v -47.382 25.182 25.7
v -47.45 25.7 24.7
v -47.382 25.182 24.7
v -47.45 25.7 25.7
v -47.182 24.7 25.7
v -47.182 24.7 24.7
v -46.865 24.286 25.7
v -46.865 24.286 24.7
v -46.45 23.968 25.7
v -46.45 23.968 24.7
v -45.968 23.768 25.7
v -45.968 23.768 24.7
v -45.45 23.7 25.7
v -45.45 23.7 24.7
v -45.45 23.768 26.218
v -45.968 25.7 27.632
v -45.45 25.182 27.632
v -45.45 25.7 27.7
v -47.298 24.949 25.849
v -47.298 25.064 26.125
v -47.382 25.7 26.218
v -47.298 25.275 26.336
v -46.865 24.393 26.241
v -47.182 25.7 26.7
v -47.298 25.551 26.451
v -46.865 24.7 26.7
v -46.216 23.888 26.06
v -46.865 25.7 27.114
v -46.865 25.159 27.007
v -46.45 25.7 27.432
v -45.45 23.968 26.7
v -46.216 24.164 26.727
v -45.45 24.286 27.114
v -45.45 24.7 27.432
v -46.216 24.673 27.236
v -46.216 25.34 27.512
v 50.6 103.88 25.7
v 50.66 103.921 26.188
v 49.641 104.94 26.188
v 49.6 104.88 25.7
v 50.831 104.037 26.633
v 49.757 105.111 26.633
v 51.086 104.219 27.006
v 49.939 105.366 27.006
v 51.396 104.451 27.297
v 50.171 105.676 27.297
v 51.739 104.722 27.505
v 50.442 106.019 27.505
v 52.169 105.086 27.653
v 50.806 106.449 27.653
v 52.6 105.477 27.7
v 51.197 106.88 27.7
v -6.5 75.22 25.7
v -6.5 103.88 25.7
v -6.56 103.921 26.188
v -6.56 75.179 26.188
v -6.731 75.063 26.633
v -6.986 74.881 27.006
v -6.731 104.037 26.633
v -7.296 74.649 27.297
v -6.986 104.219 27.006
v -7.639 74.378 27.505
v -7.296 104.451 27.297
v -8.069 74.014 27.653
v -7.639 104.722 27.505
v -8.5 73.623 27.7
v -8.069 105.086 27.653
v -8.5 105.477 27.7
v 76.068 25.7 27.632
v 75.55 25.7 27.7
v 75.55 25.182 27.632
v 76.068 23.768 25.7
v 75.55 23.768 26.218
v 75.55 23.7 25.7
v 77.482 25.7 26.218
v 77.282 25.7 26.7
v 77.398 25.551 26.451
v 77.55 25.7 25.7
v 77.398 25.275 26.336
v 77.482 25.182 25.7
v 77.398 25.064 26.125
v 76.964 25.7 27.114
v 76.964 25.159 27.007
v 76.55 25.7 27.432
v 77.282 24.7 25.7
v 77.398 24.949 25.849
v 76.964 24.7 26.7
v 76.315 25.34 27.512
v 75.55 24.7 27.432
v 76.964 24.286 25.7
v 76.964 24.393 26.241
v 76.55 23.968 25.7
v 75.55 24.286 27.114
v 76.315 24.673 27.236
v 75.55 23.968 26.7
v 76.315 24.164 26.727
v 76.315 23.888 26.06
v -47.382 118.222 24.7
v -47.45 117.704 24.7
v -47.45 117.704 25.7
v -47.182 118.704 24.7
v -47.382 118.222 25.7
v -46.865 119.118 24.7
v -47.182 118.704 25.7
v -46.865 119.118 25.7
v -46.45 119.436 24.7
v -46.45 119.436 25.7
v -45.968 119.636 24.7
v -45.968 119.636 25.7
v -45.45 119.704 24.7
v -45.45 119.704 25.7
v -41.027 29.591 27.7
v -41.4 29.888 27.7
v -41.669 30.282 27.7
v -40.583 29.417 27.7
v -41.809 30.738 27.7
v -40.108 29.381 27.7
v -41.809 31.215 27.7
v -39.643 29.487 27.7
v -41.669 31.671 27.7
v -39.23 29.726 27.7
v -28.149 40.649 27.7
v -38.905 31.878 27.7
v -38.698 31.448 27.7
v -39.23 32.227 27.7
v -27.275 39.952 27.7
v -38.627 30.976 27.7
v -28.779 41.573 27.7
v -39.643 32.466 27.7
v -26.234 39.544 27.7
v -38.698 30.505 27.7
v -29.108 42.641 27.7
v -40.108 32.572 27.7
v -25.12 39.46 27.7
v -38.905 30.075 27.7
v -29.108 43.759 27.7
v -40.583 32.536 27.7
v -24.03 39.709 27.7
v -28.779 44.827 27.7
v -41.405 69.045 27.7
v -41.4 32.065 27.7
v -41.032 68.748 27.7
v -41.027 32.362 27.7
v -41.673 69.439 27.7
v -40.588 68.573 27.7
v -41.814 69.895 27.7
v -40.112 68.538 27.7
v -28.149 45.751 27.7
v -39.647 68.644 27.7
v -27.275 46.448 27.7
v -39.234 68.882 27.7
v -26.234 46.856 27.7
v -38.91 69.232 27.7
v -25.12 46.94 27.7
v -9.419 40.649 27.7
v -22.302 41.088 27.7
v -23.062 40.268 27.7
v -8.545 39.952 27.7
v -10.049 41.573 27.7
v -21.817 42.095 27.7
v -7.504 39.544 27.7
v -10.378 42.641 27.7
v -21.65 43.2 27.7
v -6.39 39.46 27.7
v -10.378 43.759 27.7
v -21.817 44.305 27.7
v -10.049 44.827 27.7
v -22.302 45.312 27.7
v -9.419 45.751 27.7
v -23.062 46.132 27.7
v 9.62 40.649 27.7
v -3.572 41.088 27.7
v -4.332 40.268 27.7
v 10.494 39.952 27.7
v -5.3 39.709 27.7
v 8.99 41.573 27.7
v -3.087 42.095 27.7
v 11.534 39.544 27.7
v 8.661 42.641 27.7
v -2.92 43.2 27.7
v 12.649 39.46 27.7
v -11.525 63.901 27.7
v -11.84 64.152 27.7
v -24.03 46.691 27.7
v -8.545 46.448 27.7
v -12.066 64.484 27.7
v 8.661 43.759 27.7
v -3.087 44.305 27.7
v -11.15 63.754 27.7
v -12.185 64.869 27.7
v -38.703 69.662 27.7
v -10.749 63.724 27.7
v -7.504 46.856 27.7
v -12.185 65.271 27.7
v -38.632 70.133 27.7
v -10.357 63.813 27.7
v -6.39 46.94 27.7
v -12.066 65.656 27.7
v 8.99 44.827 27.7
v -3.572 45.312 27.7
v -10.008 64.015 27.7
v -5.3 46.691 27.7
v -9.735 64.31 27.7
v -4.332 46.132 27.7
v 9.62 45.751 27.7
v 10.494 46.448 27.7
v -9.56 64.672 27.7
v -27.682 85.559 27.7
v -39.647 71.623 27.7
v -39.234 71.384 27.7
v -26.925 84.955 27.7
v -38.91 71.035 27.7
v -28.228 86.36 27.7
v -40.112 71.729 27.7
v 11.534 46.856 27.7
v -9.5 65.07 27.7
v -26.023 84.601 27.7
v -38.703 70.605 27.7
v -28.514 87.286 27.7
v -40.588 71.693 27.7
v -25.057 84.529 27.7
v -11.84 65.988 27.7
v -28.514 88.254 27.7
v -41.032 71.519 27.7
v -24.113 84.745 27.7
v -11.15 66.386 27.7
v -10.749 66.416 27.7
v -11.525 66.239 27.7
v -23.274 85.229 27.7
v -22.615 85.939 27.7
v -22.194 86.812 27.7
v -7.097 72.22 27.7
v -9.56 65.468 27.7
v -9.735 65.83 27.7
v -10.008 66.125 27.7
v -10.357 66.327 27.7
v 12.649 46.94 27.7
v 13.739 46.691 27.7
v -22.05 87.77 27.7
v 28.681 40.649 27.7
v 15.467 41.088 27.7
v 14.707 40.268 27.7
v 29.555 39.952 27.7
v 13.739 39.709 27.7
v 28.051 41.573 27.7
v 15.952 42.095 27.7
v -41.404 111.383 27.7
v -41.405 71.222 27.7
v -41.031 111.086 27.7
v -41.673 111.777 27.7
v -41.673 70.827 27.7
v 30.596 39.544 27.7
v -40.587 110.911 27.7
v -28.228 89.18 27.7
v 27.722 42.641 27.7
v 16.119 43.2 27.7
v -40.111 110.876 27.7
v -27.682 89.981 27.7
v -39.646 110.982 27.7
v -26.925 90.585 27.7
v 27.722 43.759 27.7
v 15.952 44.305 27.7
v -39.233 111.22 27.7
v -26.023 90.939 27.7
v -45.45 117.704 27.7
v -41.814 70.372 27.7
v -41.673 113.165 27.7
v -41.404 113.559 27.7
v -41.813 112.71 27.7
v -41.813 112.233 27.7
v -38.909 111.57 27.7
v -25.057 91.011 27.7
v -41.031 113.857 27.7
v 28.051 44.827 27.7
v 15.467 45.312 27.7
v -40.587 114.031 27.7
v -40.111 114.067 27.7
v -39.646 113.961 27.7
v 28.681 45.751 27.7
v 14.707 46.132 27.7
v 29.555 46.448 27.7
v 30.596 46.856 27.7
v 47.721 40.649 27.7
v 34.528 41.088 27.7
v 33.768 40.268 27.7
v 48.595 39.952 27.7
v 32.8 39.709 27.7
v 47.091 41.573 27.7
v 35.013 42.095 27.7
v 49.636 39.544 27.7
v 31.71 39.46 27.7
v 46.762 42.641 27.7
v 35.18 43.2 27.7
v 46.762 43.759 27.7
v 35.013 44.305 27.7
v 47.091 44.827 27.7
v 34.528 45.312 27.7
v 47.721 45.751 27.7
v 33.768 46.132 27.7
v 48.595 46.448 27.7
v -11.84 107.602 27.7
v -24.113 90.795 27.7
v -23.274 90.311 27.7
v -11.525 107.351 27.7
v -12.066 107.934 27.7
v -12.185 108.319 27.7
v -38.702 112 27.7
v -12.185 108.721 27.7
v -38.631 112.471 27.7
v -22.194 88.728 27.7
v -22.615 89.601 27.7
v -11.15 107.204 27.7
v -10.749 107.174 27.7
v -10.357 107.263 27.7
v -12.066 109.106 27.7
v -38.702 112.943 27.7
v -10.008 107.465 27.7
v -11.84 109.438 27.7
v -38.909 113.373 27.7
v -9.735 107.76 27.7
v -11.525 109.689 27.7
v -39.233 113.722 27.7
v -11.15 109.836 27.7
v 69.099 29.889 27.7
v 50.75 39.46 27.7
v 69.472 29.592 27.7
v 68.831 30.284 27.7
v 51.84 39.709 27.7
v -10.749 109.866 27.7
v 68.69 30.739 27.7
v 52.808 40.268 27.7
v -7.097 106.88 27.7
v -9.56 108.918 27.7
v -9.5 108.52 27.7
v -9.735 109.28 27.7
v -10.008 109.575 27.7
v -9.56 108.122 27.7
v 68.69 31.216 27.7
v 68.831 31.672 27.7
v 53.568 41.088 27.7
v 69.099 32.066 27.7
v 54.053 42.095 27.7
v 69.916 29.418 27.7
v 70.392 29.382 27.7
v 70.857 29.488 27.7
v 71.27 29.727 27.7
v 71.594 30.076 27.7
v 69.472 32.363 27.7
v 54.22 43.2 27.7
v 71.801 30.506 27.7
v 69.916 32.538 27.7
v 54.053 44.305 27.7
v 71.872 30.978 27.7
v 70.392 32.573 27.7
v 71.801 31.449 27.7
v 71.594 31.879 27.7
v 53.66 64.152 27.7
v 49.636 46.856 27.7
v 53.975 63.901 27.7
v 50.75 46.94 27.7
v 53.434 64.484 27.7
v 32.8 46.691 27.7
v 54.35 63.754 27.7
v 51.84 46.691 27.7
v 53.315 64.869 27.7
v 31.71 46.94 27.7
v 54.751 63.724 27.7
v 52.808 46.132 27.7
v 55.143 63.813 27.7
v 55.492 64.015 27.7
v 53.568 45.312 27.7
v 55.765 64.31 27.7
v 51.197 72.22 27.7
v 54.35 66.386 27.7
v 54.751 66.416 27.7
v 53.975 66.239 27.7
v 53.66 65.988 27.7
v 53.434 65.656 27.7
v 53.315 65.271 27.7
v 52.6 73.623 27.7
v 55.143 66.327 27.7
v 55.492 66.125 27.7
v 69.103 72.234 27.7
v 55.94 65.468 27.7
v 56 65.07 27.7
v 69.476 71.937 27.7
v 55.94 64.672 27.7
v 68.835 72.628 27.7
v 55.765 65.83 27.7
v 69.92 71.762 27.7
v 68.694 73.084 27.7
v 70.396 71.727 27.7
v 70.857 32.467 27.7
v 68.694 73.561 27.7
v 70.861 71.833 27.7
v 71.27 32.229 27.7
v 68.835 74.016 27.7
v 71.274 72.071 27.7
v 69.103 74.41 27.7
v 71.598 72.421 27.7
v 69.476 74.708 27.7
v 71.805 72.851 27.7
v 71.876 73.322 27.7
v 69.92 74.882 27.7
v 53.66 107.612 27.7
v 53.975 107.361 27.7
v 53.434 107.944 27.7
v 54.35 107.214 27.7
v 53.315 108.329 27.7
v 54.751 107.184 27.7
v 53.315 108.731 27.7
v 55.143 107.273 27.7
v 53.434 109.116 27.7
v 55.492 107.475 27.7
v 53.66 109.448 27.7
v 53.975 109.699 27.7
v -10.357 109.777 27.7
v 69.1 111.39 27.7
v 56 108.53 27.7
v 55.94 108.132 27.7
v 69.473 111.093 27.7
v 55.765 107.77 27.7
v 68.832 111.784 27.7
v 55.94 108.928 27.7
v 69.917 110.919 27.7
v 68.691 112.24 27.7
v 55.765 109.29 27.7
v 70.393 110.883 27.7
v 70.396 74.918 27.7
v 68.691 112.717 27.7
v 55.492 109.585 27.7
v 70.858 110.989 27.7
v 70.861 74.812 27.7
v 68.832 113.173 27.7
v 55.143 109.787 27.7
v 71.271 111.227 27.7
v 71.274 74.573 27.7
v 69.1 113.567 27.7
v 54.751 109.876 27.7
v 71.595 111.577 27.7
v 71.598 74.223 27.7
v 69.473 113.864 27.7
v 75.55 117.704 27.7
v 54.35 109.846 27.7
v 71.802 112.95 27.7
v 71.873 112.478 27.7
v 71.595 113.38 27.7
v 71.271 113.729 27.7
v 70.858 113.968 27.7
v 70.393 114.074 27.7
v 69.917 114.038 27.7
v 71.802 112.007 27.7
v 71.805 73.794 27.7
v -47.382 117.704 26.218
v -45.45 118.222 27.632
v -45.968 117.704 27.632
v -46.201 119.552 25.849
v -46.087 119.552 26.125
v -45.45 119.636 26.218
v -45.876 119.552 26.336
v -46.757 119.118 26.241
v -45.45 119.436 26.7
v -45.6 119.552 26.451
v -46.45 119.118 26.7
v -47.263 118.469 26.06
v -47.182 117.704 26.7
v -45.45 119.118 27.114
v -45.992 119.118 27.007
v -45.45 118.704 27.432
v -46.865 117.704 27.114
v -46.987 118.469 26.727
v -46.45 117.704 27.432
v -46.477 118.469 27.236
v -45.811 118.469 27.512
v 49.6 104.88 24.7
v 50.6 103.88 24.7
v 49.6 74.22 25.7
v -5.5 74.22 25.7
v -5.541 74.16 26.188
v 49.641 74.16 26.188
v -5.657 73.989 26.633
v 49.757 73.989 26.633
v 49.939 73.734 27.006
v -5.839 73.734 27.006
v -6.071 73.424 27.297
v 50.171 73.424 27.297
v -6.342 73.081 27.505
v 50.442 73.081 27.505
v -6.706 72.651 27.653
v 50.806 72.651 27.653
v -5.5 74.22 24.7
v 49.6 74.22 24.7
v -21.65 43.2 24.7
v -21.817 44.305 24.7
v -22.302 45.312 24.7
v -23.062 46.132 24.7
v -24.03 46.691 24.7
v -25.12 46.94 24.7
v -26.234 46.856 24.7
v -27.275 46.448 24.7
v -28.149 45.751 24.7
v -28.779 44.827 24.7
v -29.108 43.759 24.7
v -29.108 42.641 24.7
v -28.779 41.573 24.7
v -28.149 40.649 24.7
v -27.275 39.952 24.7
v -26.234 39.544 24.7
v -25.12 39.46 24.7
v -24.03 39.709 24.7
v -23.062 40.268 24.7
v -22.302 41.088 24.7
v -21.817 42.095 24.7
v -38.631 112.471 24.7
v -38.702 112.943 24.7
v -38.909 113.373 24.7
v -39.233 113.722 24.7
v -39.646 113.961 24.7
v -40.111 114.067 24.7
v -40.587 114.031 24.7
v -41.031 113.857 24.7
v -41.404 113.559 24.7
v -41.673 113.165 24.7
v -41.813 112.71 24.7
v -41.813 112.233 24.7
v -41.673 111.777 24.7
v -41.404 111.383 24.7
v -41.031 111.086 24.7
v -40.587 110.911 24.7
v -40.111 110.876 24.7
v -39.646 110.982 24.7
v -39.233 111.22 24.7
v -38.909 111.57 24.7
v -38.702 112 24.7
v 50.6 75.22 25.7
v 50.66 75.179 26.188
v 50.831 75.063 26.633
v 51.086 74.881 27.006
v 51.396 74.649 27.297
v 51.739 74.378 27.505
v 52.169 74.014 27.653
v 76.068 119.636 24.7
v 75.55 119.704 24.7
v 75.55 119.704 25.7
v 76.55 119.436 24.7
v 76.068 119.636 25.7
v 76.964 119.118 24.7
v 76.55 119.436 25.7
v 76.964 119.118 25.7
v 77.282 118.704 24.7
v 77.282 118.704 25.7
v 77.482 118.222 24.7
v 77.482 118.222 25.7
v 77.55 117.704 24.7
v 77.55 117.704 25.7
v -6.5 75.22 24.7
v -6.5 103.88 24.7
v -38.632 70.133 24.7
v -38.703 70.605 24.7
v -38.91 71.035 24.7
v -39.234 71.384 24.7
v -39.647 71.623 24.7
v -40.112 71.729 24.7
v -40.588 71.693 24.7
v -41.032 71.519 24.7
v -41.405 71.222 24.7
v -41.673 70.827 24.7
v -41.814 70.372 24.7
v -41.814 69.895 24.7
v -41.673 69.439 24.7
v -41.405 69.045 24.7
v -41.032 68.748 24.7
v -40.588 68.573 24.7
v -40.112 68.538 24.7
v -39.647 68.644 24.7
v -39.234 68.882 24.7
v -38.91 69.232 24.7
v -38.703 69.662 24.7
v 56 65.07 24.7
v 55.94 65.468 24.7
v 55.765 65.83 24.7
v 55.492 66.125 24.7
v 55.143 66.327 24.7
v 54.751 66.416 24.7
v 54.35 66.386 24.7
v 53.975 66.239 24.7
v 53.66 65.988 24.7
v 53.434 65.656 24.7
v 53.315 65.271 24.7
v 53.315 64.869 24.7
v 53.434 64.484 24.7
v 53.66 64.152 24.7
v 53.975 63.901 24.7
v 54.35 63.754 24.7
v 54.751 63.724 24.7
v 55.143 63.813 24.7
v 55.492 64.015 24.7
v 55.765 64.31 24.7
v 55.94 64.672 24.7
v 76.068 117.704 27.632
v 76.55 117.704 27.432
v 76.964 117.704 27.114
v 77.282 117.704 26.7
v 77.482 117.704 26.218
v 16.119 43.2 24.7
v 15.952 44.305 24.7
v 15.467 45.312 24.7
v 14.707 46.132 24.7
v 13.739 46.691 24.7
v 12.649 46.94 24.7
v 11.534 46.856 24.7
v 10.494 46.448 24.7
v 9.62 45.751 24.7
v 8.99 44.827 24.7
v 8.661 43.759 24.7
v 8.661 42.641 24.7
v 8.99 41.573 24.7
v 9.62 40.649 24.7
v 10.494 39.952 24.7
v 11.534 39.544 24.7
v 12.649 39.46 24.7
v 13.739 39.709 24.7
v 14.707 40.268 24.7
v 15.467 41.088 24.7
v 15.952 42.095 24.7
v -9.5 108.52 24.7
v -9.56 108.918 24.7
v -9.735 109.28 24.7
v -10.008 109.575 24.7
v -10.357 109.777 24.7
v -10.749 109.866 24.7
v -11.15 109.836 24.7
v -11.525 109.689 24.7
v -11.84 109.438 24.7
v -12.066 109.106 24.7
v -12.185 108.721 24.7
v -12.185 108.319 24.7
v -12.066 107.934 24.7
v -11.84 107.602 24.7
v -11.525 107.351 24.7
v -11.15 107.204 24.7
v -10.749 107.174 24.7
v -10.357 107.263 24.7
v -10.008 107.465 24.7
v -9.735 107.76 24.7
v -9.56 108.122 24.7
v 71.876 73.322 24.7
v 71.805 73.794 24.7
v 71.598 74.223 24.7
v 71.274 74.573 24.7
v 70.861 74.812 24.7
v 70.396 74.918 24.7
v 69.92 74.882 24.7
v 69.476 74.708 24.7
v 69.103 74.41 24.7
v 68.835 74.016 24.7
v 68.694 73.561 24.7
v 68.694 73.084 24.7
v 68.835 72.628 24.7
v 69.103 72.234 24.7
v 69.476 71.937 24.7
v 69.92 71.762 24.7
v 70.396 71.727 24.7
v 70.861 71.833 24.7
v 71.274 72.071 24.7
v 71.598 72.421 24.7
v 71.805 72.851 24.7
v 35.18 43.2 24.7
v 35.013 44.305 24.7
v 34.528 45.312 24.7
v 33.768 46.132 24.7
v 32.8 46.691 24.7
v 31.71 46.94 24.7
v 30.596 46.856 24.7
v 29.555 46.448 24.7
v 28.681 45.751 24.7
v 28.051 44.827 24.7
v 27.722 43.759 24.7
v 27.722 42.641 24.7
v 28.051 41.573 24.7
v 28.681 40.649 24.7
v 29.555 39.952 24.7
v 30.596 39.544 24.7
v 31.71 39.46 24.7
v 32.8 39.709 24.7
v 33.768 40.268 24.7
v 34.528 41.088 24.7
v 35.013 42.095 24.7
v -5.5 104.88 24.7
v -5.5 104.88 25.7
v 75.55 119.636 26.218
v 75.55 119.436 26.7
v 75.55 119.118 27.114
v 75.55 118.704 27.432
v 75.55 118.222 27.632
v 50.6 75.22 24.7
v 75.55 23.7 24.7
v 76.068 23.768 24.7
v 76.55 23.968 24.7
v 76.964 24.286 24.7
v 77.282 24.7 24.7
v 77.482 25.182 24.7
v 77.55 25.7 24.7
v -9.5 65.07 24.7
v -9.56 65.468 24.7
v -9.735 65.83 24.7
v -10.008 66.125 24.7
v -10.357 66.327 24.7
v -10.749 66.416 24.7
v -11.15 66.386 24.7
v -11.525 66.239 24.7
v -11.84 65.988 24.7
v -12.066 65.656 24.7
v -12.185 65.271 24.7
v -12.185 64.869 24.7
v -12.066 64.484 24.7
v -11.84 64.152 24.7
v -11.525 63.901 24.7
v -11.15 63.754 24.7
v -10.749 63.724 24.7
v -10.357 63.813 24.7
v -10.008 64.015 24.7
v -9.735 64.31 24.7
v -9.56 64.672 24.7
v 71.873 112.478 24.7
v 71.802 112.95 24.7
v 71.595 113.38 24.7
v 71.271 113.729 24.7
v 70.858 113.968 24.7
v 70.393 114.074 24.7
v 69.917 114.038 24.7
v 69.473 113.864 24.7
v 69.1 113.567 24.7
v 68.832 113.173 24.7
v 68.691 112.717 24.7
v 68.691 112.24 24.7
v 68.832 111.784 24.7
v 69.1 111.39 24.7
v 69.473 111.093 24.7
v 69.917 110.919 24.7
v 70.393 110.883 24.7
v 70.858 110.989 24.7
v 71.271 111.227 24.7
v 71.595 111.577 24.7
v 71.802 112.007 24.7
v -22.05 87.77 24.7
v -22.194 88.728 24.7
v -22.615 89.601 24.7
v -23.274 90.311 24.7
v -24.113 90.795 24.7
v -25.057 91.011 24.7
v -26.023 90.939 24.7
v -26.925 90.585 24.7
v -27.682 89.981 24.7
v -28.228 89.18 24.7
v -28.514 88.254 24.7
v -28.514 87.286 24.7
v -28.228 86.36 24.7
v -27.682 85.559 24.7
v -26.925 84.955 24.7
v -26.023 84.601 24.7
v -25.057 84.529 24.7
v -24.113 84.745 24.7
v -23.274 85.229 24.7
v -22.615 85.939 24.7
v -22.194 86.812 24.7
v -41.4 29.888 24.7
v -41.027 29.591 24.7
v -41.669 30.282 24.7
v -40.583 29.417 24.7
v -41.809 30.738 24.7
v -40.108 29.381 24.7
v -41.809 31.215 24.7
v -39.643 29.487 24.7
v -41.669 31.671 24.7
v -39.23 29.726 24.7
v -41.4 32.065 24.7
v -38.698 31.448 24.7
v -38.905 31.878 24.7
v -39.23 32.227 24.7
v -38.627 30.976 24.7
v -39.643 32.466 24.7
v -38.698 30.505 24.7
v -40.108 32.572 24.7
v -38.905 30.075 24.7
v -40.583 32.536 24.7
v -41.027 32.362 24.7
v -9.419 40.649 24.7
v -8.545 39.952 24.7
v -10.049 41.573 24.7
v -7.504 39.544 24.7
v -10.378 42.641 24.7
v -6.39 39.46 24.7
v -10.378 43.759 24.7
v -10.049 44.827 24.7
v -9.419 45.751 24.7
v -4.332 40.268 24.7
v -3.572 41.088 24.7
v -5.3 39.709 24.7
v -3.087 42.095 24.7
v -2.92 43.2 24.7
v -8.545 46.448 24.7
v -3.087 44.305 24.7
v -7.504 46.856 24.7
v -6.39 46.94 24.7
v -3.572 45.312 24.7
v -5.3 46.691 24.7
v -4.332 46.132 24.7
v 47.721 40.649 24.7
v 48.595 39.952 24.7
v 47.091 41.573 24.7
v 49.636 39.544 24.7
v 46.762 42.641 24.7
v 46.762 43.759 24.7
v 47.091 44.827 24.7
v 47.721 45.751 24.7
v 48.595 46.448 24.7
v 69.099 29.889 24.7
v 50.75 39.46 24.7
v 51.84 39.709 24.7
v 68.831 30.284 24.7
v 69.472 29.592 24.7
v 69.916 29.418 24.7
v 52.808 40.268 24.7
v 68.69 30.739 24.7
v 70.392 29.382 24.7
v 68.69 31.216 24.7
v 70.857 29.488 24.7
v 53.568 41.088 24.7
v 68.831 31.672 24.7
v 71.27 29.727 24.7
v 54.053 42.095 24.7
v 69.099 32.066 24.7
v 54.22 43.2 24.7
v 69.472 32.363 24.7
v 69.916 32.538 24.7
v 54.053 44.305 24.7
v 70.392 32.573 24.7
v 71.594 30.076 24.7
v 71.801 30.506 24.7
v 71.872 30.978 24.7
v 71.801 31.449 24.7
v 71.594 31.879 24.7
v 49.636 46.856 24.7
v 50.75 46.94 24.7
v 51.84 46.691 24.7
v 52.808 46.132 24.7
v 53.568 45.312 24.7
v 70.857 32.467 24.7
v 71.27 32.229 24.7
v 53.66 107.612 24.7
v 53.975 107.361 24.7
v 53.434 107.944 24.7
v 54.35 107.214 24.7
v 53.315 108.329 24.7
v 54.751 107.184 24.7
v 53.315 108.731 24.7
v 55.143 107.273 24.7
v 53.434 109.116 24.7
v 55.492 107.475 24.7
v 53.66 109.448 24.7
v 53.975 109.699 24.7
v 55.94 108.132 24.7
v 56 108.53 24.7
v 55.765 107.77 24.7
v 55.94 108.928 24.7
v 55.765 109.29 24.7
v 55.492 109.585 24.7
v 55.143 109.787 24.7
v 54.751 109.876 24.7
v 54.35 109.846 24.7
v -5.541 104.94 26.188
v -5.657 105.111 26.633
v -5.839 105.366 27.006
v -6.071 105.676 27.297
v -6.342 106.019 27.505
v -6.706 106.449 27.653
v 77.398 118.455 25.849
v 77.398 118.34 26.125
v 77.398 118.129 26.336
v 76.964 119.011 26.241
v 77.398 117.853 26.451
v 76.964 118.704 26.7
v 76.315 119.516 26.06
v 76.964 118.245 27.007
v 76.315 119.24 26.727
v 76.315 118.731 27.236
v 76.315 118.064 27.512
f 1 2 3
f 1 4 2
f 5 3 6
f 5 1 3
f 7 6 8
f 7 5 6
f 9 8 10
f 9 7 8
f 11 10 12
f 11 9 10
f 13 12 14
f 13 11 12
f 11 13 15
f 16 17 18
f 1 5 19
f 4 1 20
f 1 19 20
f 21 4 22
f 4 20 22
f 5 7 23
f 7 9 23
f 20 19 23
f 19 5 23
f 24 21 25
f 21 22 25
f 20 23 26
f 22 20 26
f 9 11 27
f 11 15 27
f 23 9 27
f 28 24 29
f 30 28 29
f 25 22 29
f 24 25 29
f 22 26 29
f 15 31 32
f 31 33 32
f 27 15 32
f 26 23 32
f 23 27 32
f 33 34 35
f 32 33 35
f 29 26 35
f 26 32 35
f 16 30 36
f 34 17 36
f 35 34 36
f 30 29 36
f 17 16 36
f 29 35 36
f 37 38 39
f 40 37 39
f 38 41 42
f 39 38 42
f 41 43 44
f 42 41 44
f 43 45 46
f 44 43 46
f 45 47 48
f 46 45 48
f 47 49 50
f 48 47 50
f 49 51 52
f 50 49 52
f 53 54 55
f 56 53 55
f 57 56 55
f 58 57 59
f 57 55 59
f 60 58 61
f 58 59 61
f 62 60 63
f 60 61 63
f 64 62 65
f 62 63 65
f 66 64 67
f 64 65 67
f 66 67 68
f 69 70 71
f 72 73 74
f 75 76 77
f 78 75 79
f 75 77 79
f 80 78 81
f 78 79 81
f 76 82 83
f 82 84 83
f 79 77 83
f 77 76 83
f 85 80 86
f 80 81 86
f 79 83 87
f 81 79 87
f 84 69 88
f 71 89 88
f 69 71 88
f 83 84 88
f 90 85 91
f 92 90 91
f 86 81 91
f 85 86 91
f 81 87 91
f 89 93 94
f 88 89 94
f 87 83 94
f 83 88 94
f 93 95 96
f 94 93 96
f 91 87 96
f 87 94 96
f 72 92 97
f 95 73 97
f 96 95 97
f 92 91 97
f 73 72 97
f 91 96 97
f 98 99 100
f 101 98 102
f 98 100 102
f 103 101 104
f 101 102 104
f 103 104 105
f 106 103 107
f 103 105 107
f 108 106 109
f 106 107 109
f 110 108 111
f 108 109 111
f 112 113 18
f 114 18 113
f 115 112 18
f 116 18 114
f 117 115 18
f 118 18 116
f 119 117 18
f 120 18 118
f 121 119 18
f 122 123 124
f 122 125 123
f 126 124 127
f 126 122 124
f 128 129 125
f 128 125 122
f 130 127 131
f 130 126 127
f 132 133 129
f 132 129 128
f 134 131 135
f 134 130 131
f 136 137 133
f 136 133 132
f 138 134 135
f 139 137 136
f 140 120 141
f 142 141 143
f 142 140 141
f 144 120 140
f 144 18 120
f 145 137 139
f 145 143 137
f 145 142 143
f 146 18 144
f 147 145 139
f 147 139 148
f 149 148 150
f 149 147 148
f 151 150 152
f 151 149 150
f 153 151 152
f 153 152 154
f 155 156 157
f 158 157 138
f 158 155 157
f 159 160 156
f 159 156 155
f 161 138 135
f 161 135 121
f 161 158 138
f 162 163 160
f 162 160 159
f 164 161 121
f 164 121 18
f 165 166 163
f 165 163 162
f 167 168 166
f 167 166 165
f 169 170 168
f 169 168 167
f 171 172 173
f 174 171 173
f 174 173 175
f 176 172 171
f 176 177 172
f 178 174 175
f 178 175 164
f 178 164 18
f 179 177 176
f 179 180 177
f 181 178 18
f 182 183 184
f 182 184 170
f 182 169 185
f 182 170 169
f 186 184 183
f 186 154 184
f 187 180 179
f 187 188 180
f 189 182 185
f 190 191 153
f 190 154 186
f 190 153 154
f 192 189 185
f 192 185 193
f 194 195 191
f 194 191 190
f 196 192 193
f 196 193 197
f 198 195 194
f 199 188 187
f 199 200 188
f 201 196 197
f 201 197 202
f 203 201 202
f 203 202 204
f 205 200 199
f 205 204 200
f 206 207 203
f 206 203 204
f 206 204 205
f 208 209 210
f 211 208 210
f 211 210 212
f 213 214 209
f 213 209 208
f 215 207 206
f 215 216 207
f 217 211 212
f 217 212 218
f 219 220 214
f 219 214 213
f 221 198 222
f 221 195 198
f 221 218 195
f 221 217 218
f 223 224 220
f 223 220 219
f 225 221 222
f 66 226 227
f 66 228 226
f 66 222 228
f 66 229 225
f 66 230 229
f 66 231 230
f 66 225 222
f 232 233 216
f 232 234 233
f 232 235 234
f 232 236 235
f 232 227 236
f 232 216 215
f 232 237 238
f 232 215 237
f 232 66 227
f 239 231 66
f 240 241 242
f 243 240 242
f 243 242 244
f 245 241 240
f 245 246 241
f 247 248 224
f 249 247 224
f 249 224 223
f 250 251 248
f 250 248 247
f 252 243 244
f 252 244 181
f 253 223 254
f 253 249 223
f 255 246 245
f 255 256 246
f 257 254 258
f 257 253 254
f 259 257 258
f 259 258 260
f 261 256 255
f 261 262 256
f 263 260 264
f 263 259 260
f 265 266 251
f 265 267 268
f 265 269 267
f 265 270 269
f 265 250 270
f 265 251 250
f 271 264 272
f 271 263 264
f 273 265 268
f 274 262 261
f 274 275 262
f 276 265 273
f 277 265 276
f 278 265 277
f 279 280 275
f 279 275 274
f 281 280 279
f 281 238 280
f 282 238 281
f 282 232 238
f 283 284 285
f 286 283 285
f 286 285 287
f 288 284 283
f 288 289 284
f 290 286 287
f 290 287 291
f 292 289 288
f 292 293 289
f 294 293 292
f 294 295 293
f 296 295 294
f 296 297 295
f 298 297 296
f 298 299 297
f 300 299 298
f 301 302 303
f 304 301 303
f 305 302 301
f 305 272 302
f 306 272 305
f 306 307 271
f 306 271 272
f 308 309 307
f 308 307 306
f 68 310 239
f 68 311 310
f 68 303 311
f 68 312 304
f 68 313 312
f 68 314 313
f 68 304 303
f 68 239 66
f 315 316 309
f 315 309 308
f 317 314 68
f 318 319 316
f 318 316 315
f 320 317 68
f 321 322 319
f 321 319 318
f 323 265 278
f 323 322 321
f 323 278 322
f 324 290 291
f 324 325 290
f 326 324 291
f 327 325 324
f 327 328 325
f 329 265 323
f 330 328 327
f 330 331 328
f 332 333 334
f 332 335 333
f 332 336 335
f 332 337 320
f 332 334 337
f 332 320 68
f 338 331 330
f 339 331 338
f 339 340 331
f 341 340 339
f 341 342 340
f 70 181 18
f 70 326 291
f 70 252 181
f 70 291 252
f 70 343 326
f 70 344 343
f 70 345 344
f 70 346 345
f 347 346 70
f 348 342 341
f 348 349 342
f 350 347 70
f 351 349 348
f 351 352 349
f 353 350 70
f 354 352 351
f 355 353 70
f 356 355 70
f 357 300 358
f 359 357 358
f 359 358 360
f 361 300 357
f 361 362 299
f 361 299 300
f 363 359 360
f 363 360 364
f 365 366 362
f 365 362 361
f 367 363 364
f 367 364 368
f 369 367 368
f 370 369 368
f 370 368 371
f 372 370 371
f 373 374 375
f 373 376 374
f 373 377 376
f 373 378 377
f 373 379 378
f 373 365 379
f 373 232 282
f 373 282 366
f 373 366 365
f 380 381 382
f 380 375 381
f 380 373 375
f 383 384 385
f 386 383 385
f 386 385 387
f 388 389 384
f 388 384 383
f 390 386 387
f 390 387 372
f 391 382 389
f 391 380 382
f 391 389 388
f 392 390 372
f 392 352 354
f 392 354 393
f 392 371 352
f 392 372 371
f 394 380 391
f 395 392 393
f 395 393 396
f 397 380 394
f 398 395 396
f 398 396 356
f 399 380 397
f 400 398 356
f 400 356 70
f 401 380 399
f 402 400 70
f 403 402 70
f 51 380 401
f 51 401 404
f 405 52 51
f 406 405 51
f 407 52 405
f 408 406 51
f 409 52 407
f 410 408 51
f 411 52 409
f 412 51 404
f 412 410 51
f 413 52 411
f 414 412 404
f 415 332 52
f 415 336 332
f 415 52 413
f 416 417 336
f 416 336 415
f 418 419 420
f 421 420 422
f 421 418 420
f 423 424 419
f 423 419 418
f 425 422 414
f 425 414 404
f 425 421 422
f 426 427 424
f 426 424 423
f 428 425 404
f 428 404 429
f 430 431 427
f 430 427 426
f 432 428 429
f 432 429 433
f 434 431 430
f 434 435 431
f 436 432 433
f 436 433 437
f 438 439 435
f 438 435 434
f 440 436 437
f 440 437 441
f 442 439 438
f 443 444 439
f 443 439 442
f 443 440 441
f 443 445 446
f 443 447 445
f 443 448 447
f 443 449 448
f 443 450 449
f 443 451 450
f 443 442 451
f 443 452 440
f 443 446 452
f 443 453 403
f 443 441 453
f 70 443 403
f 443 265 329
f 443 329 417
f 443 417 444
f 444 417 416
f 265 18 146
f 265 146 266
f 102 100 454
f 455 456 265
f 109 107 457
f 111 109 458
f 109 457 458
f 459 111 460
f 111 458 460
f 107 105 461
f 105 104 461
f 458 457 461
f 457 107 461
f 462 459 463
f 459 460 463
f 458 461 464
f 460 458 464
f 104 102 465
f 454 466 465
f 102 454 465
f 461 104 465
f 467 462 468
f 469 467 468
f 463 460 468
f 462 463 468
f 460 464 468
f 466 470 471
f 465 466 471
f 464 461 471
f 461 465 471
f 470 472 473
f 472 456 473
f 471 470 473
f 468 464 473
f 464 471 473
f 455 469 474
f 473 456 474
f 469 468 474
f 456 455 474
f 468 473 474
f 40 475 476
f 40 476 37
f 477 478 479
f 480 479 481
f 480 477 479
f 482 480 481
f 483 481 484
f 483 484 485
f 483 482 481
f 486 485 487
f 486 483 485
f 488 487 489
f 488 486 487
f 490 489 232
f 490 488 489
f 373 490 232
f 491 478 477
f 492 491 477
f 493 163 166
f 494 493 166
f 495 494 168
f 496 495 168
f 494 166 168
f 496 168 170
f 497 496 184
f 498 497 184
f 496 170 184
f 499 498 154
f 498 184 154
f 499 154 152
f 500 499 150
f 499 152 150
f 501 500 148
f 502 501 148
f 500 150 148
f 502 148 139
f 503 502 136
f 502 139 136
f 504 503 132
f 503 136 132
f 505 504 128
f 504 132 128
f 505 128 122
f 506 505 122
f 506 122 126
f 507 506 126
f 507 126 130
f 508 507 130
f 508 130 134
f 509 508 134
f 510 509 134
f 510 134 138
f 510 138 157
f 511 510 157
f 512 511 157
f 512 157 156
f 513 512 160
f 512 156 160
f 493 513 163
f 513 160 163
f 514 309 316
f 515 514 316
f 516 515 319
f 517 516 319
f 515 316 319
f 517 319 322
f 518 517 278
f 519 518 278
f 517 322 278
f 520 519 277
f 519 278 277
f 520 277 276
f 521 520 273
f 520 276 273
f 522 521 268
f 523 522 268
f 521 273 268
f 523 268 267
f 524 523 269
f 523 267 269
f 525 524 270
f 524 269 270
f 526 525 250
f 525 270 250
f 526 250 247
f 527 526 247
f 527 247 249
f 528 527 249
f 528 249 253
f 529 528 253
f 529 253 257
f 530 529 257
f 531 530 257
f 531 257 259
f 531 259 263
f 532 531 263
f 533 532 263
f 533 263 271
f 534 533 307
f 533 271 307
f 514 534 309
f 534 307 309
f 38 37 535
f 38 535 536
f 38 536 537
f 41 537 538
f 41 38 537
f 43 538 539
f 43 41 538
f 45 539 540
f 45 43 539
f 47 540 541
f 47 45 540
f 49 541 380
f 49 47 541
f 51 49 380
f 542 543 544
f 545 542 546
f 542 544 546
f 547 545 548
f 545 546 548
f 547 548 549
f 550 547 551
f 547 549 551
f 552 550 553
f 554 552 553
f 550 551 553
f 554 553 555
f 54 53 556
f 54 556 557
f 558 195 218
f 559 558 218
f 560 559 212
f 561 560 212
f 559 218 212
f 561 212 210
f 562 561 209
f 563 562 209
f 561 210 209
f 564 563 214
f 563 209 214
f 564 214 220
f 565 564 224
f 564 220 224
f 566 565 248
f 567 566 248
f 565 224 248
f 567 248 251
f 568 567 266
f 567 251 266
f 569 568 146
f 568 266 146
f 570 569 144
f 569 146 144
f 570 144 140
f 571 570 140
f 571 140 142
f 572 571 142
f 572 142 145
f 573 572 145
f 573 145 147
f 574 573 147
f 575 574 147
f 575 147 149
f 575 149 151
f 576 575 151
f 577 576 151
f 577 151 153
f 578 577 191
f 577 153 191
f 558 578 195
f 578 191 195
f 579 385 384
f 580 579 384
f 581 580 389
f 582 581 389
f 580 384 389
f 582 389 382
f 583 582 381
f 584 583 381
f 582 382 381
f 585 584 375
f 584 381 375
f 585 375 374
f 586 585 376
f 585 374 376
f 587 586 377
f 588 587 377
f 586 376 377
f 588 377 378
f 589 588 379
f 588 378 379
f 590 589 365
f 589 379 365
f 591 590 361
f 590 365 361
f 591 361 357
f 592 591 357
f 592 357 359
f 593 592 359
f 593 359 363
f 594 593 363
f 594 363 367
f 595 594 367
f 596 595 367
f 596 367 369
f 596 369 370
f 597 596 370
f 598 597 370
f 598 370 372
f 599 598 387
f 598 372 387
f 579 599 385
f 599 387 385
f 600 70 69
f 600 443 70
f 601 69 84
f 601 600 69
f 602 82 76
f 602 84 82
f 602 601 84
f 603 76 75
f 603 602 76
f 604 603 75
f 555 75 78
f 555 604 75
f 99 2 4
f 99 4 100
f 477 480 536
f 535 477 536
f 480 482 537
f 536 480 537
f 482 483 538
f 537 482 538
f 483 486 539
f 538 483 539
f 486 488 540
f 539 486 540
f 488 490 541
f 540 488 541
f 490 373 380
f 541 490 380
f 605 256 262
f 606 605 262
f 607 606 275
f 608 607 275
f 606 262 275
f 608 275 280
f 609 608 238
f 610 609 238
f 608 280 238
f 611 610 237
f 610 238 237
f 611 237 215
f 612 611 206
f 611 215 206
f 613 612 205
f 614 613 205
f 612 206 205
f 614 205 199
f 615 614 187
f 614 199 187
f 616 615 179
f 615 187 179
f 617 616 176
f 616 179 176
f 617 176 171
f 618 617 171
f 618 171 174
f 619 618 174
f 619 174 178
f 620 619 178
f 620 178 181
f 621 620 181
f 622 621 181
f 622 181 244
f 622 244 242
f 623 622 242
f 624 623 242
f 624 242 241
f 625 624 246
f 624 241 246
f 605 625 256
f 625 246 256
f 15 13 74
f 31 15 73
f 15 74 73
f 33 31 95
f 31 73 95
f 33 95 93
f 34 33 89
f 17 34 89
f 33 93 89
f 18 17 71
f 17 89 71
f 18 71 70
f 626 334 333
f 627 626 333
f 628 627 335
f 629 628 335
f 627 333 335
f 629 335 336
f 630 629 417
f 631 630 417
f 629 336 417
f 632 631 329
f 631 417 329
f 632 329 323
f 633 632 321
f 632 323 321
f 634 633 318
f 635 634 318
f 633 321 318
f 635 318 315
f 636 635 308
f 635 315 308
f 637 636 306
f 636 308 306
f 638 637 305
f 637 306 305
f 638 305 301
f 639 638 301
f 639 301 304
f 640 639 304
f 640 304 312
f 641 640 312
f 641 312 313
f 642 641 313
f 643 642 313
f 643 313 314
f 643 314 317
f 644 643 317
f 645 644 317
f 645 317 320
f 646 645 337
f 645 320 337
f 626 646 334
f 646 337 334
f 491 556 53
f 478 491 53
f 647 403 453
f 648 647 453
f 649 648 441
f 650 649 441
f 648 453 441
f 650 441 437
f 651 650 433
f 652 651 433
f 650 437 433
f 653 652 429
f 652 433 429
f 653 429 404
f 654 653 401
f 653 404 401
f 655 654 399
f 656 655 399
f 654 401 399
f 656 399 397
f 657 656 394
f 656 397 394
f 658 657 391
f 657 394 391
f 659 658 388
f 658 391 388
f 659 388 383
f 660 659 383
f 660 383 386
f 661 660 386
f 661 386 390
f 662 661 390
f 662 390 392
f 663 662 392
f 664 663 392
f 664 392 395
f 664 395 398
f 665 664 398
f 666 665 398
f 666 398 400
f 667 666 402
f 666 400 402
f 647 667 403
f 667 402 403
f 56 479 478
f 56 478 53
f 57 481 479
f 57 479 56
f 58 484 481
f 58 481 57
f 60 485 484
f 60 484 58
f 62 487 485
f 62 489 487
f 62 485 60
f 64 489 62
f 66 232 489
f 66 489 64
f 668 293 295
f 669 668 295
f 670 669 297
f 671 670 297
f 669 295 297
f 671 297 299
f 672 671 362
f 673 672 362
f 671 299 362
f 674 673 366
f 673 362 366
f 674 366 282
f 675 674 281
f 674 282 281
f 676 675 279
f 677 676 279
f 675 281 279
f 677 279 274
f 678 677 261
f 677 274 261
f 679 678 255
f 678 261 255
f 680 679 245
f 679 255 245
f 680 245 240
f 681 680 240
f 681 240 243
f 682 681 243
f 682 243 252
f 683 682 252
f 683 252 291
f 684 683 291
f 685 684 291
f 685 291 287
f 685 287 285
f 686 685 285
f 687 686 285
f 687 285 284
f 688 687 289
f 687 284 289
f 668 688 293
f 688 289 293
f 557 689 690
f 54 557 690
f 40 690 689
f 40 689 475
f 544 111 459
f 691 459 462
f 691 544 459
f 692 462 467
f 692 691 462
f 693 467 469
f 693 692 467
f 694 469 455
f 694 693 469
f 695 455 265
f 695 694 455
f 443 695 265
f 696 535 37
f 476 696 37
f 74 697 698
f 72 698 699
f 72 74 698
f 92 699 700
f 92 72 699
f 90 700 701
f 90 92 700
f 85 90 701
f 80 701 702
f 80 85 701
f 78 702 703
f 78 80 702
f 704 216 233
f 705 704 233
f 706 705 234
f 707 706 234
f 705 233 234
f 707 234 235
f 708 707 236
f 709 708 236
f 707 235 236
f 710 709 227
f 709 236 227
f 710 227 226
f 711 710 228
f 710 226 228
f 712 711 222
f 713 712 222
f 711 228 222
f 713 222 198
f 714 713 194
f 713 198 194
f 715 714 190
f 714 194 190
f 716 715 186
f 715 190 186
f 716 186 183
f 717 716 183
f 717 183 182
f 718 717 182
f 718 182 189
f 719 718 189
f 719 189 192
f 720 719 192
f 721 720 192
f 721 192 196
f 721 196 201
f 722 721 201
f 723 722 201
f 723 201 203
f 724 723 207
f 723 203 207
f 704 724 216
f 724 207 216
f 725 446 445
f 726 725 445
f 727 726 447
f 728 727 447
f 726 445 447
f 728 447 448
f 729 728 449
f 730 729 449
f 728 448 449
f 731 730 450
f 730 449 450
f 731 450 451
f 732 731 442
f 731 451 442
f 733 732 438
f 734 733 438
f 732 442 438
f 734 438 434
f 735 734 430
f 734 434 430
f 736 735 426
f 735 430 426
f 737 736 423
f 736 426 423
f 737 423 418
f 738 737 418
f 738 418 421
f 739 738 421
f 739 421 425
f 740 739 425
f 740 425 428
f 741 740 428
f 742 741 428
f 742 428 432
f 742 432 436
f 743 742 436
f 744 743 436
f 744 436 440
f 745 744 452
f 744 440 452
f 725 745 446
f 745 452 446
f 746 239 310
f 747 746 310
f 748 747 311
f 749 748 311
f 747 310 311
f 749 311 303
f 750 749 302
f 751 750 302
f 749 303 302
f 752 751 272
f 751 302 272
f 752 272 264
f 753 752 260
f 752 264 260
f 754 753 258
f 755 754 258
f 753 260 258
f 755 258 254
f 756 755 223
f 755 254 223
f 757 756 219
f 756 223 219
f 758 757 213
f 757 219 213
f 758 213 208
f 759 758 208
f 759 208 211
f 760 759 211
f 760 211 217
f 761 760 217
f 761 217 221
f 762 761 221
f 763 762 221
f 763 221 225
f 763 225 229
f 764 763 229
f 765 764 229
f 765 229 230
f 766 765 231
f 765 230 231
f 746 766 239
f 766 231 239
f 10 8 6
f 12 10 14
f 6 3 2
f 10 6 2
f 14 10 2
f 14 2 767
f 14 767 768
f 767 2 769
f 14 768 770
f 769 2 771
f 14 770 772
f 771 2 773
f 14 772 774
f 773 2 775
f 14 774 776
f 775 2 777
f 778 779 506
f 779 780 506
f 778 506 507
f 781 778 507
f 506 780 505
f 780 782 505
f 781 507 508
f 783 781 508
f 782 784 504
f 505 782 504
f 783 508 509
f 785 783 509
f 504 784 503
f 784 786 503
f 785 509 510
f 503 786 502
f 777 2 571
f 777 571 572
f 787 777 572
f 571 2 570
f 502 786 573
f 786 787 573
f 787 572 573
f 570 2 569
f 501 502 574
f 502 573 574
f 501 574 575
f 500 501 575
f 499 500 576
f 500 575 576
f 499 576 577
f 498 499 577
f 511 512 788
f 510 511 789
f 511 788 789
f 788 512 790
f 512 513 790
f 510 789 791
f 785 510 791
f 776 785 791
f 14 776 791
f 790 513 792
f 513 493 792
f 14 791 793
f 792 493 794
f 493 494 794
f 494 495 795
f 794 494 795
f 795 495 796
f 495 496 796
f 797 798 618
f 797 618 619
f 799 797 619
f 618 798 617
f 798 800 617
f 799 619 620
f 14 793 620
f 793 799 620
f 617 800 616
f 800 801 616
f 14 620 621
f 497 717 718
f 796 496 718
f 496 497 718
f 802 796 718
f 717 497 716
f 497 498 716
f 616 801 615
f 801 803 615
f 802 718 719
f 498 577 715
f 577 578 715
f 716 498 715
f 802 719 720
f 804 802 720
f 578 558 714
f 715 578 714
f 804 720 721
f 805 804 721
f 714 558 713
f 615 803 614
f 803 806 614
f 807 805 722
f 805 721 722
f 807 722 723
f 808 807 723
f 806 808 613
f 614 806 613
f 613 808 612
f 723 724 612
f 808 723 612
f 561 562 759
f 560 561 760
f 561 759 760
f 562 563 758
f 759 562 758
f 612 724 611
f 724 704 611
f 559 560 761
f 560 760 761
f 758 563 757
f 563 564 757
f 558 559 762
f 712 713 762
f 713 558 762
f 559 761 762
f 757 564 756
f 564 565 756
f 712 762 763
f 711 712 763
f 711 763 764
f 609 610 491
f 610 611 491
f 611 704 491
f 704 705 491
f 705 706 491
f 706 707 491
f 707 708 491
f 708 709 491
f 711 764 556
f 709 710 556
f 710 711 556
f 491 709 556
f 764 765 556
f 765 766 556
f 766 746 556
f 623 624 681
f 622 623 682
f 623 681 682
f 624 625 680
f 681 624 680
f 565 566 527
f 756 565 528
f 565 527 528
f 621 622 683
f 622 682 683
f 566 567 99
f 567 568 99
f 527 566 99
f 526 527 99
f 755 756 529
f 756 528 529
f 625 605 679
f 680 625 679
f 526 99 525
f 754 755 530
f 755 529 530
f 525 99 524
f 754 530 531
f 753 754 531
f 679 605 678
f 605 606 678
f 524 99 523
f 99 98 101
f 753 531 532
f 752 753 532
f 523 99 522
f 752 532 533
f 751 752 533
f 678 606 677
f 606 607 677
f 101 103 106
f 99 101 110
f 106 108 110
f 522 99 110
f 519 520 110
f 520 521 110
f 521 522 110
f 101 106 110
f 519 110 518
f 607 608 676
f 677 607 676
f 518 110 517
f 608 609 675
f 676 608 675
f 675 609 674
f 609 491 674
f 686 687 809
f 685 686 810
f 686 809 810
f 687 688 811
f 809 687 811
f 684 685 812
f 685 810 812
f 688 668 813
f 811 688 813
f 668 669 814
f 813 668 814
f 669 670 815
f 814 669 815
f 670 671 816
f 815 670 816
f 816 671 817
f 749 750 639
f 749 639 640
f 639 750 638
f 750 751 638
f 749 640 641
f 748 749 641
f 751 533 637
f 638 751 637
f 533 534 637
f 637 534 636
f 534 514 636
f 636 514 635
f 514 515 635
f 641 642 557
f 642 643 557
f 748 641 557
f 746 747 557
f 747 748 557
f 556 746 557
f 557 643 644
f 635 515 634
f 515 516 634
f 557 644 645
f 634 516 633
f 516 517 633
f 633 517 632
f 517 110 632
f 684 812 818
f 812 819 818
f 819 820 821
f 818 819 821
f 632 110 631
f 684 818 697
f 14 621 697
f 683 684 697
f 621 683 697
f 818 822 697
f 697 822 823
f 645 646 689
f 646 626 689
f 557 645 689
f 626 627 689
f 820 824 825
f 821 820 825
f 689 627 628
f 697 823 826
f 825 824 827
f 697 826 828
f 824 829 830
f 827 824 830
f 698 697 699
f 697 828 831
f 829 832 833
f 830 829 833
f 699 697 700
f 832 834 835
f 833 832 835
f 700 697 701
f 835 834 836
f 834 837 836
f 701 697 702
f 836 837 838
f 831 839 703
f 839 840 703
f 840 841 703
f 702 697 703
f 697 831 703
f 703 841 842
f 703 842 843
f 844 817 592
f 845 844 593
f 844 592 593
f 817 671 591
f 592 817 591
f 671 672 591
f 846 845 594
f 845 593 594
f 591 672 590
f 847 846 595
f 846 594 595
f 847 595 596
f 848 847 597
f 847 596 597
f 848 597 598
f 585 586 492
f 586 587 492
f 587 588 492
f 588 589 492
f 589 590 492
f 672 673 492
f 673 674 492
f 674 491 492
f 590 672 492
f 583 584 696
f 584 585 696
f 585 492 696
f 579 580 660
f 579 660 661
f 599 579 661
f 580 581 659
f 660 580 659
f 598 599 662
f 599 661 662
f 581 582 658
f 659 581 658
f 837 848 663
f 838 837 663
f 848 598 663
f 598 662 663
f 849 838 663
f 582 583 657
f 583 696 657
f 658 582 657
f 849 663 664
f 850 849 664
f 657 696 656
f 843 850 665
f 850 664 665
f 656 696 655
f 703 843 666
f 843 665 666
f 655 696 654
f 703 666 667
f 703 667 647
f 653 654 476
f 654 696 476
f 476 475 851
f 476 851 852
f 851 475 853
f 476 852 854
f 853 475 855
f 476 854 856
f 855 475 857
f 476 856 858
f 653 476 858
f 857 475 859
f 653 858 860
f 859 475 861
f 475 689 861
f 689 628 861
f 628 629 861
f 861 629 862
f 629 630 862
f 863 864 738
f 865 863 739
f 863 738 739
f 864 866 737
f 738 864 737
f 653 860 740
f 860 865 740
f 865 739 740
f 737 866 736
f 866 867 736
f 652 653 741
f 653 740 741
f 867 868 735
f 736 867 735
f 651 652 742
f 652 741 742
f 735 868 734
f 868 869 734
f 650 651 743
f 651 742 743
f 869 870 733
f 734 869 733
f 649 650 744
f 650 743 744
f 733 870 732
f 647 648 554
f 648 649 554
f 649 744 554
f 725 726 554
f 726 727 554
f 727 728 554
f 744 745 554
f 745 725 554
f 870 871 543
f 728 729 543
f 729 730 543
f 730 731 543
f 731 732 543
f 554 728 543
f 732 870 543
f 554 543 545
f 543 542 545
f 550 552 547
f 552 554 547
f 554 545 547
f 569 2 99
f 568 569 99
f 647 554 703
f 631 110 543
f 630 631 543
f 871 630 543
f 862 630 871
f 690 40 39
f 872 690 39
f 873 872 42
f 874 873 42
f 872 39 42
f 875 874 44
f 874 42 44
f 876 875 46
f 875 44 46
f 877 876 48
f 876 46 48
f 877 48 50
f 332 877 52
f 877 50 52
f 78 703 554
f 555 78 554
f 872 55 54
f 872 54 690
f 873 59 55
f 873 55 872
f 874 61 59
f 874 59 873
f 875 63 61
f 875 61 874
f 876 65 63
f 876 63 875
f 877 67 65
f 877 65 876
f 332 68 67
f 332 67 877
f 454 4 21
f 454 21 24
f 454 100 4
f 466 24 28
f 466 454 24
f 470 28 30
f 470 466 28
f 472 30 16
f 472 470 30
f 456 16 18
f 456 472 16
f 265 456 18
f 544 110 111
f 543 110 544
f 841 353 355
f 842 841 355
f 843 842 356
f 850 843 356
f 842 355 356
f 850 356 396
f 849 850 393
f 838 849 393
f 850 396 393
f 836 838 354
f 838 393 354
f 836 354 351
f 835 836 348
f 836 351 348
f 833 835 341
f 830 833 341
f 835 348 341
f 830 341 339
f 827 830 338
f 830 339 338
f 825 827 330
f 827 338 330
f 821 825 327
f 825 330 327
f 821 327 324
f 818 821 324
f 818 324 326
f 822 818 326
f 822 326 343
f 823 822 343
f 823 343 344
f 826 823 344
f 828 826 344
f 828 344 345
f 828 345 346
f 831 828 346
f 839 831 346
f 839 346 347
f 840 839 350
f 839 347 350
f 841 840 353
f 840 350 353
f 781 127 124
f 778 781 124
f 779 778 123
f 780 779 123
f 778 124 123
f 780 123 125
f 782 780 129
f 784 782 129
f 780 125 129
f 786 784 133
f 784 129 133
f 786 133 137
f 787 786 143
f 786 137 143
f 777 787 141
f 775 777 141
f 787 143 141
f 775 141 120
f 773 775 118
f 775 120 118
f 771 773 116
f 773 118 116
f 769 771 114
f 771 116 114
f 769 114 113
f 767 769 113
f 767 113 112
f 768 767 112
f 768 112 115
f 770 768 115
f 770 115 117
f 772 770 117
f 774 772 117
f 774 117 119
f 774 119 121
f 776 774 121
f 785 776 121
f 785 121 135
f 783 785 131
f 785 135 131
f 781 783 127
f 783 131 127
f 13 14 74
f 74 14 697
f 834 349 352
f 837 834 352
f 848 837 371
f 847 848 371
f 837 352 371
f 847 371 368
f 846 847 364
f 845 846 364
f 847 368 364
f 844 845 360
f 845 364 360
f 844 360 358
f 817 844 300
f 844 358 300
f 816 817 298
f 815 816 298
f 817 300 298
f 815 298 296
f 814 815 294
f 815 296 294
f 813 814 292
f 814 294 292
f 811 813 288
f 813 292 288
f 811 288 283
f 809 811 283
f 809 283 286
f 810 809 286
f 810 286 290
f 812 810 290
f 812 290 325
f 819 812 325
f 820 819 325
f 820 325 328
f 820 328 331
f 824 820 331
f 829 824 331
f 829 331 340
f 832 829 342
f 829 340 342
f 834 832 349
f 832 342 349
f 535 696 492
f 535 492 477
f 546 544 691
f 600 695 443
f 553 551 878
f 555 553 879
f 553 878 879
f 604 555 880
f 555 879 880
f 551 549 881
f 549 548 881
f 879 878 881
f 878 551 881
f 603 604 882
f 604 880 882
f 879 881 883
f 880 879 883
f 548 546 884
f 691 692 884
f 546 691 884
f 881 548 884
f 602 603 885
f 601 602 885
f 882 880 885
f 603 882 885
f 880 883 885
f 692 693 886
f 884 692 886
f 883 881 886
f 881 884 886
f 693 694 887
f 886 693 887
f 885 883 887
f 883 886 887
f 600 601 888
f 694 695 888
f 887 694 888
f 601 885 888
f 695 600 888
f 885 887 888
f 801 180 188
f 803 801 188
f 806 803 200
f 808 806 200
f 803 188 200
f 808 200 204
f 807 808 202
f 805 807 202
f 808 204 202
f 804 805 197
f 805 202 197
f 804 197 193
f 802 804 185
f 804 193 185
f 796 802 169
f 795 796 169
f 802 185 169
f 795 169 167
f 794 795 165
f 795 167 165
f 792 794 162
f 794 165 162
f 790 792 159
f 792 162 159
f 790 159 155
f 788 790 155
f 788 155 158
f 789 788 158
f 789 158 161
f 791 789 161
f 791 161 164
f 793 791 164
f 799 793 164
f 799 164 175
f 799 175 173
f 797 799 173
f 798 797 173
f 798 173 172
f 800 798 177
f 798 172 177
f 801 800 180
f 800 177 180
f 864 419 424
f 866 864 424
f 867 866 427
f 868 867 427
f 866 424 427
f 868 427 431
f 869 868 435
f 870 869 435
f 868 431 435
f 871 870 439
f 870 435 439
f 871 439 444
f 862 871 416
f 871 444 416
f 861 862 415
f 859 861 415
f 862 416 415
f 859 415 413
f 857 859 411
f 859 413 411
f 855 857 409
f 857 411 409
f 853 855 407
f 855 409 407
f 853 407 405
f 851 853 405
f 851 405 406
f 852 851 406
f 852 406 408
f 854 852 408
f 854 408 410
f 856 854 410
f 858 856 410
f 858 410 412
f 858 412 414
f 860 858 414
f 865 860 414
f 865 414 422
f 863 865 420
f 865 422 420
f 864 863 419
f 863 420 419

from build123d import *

# Parameters (mm, degrees)
SKETCH015_W      = 125.000379
SKETCH015_H      = 96.004006
EXTRUDE013_DEPTH = 3
SKETCH004_R      = 3.75
HOLE001_DEPTH    = 3
SKETCH005_R      = 3.25
HOLE002_DEPTH    = 3
SKETCH007_R      = 3.75
HOLE003_DEPTH    = 3
SKETCH006_R      = 1.35
HOLE004_DEPTH    = 3
SKETCH008_W      = 57.1
SKETCH008_H      = 30.66
POCKET_DEPTH     = 3
SKETCH021_R      = 1.6
HOLE007_DEPTH    = 3
HOLE007_TIPS_R   = 1.6
FILLET_R         = 2
FILLET001_R      = 2
CHAMFER_SIZE     = 1


with BuildPart() as part:
    # Sketch015 → Extrude013 (new body)
    with BuildSketch(Plane.XY):
        with Locations((15.049815, 71.702003)):
            Rectangle(SKETCH015_W, SKETCH015_H)
    extrude(amount=EXTRUDE013_DEPTH)

    # Sketch004 (on Face6 of Extrude013) → Hole001 (cut)
    with BuildSketch(Plane.XY.offset(3)):
        with Locations((-25.4, 43.200001)):
            Circle(SKETCH004_R)
    extrude(amount=-HOLE001_DEPTH, mode=Mode.SUBTRACT)

    # Sketch005 (on Face5 of Hole001) → Hole002 (cut)
    with BuildSketch(Plane.XY.offset(3)):
        with Locations((-25.299999, 87.769998)):
            Circle(SKETCH005_R)
    extrude(amount=-HOLE002_DEPTH, mode=Mode.SUBTRACT)

    # Sketch007 (on Face5 of Hole002) → Hole003 (cut)
    with BuildSketch(Plane.XY.offset(3)):
        with Locations((-6.67, 43.199999)):
            Circle(SKETCH007_R)
        with Locations((12.368629, 43.200002)):
            Circle(SKETCH007_R)
        with Locations((31.429999, 43.199999)):
            Circle(SKETCH007_R)
        with Locations((50.469999, 43.199999)):
            Circle(SKETCH007_R)
    extrude(amount=-HOLE003_DEPTH, mode=Mode.SUBTRACT)

    # Sketch006 (on Face5 of Hole003) → Hole004 (cut)
    with BuildSketch(Plane.XY.offset(3)):
        with Locations((-10.85, 65.069999)):
            Circle(SKETCH006_R)
        with Locations((54.649999, 65.069999)):
            Circle(SKETCH006_R)
        with Locations((54.649999, 108.529998)):
            Circle(SKETCH006_R)
        with Locations((-10.85, 108.519998)):
            Circle(SKETCH006_R)
    extrude(amount=-HOLE004_DEPTH, mode=Mode.SUBTRACT)

    # Sketch008 (on Face5 of Hole004) → Pocket (cut)
    with BuildSketch(Plane.XY.offset(3)):
        with Locations((22.05, 89.549998)):
            Rectangle(SKETCH008_W, SKETCH008_H)
    extrude(amount=-POCKET_DEPTH, mode=Mode.SUBTRACT)

    # Sketch021 (on Face5 of Pocket) → Hole007 (cut)
    with BuildSketch(Plane.XY.offset(3)):
        with Locations((-40.227337, 30.97648)):
            Circle(SKETCH021_R)
        with Locations((-40.231945, 70.133278)):
            Circle(SKETCH021_R)
        with Locations((-40.231026, 112.471214)):
            Circle(SKETCH021_R)
        with Locations((70.273193, 112.478386)):
            Circle(SKETCH021_R)
        with Locations((70.276276, 73.322159)):
            Circle(SKETCH021_R)
        with Locations((70.272247, 30.977751)):
            Circle(SKETCH021_R)
    extrude(amount=-HOLE007_DEPTH, mode=Mode.SUBTRACT)

    # Hole007 tips → Hole007 tip 1 section 0
    with BuildSketch(Plane.XY, mode=Mode.PRIVATE) as hole007_tip_1_s0:
        with Locations((-40.227337, 30.97648)):
            Circle(HOLE007_TIPS_R)
    loft([hole007_tip_1_s0.sketch, Vertex(-40.227337, 30.97648, -0.961377)], mode=Mode.SUBTRACT)

    # Hole007 tips → Hole007 tip 2 section 0
    with BuildSketch(Plane.XY, mode=Mode.PRIVATE) as hole007_tip_2_s0:
        with Locations((-40.231945, 70.133278)):
            Circle(HOLE007_TIPS_R)
    loft([hole007_tip_2_s0.sketch, Vertex(-40.231945, 70.133278, -0.961377)], mode=Mode.SUBTRACT)

    # Hole007 tips → Hole007 tip 3 section 0
    with BuildSketch(Plane.XY, mode=Mode.PRIVATE) as hole007_tip_3_s0:
        with Locations((-40.231026, 112.471214)):
            Circle(HOLE007_TIPS_R)
    loft([hole007_tip_3_s0.sketch, Vertex(-40.231026, 112.471214, -0.961377)], mode=Mode.SUBTRACT)

    # Hole007 tips → Hole007 tip 4 section 0
    with BuildSketch(Plane.XY, mode=Mode.PRIVATE) as hole007_tip_4_s0:
        with Locations((70.273193, 112.478386)):
            Circle(HOLE007_TIPS_R)
    loft([hole007_tip_4_s0.sketch, Vertex(70.273193, 112.478386, -0.961377)], mode=Mode.SUBTRACT)

    # Hole007 tips → Hole007 tip 5 section 0
    with BuildSketch(Plane.XY, mode=Mode.PRIVATE) as hole007_tip_5_s0:
        with Locations((70.276276, 73.322159)):
            Circle(HOLE007_TIPS_R)
    loft([hole007_tip_5_s0.sketch, Vertex(70.276276, 73.322159, -0.961377)], mode=Mode.SUBTRACT)

    # Hole007 tips → Hole007 tip 6 section 0
    with BuildSketch(Plane.XY, mode=Mode.PRIVATE) as hole007_tip_6_s0:
        with Locations((70.272247, 30.977751)):
            Circle(HOLE007_TIPS_R)
    loft([hole007_tip_6_s0.sketch, Vertex(70.272247, 30.977751, -0.961377)], mode=Mode.SUBTRACT)

    # Fillet
    fillet_edges = [part.edges().sort_by_distance(p)[0] for p in [
        (15.049814, 23.7, 3),
        (-47.450375, 23.7, 1.5),
        (-47.450375, 71.702003, 3),
        (-47.450375, 119.704006, 1.5),
        (15.049814, 119.704006, 3),
        (77.550004, 119.704006, 1.5),
        (77.550004, 71.702003, 3),
        (77.550004, 23.7, 1.5),
    ]]
    fillet(fillet_edges, radius=FILLET_R)

    # Fillet001
    fillet001_edges = [part.edges().sort_by_distance(p)[0] for p in [
        (-6.5, 89.549998, 3),
        (22.05, 104.879998, 3),
        (50.6, 89.549998, 3),
        (22.05, 74.219998, 3),
    ]]
    fillet(fillet001_edges, radius=FILLET001_R)

    # Chamfer
    chamfer_edges = [part.edges().sort_by_distance(p)[0] for p in [
        (51.307902, 105.5879, 2.526592),
        (51.307902, 73.512096, 2.526592),
        (-7.207902, 73.512096, 2.526592),
        (-7.207902, 105.5879, 2.526592),
    ]]
    chamfer(chamfer_edges, length=CHAMFER_SIZE)


with BuildPart() as part_1:
    # Body001 placement: moved
    add(part.part.moved(Location((0, 0, 24.7))))


solid = part_1.part
